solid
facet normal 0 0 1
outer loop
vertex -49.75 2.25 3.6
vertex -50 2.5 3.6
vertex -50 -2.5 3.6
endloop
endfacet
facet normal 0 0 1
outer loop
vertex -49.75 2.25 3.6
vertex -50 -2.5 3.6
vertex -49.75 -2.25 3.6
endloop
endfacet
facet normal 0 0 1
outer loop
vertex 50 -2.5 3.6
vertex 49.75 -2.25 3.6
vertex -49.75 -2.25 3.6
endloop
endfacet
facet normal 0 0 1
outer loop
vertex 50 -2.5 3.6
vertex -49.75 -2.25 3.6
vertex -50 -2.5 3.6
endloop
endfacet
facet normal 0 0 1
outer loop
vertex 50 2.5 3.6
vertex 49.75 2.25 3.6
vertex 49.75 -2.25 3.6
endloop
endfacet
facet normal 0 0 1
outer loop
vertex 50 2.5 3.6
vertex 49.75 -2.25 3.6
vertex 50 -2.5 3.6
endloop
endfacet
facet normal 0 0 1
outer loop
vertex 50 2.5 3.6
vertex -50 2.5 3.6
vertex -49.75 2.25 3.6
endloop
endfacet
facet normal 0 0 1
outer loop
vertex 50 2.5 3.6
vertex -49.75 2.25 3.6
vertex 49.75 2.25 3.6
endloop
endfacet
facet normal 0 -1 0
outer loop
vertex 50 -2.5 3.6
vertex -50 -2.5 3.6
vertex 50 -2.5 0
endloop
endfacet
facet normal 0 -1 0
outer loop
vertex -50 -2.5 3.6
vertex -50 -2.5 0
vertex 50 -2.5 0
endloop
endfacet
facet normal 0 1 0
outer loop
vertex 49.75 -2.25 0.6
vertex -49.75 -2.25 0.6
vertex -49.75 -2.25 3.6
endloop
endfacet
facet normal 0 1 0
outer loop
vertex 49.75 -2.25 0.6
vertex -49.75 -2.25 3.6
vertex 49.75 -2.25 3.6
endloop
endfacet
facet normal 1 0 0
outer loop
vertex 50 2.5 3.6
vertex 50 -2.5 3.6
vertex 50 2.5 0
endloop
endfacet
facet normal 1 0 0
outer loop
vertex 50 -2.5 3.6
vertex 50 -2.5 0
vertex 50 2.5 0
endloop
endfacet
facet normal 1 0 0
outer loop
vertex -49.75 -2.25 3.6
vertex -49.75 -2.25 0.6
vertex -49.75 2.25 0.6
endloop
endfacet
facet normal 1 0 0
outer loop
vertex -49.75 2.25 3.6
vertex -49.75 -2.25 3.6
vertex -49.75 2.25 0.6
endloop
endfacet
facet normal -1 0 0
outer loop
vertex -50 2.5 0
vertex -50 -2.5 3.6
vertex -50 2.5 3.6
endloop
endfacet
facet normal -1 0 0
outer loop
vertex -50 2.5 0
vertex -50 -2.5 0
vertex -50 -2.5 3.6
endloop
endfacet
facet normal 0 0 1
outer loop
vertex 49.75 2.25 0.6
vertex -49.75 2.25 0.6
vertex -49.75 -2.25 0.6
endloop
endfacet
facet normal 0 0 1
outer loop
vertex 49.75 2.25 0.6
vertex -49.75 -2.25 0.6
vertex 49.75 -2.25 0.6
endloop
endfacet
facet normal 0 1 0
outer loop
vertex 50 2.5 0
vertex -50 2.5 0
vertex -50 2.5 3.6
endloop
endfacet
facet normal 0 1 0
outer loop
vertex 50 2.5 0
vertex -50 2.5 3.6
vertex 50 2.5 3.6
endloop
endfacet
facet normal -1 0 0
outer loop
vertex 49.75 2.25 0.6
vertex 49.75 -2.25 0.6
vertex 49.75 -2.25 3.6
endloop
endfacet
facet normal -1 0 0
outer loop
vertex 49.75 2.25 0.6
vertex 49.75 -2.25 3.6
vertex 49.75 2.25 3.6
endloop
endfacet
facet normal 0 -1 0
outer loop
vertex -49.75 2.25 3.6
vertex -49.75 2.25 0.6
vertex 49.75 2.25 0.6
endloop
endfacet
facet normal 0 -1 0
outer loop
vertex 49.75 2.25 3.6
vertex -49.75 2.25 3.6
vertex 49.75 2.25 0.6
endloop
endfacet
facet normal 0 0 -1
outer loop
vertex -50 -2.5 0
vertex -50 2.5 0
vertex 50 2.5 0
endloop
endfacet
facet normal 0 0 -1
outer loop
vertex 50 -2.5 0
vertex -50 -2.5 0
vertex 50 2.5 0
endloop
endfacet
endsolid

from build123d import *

# Parameters (mm, degrees)
F0_W     = 100
F0_H     = 5
F1_DEPTH = 0.6
F2_W     = 100
F2_H     = 5
F4_DEPTH = 3
F3_W     = 99.5
F3_H     = 4.5
F5_DEPTH = 25


with BuildPart() as f1:
    # F0 (on Top) → F1 (new body)
    with BuildSketch(Plane.XY):
        Rectangle(F0_W, F0_H)
    extrude(amount=F1_DEPTH)

    # F2 (on face) → F4 (join)
    with BuildSketch(Plane.XY.offset(0.6)):
        Rectangle(F2_W, F2_H)
    extrude(amount=F4_DEPTH)

    # F3 (on face) → F5 (cut)
    with BuildSketch(Plane.XY.offset(0.6)):
        Rectangle(F3_W, F3_H)
    extrude(amount=F5_DEPTH, mode=Mode.SUBTRACT)


solid = f1.part
